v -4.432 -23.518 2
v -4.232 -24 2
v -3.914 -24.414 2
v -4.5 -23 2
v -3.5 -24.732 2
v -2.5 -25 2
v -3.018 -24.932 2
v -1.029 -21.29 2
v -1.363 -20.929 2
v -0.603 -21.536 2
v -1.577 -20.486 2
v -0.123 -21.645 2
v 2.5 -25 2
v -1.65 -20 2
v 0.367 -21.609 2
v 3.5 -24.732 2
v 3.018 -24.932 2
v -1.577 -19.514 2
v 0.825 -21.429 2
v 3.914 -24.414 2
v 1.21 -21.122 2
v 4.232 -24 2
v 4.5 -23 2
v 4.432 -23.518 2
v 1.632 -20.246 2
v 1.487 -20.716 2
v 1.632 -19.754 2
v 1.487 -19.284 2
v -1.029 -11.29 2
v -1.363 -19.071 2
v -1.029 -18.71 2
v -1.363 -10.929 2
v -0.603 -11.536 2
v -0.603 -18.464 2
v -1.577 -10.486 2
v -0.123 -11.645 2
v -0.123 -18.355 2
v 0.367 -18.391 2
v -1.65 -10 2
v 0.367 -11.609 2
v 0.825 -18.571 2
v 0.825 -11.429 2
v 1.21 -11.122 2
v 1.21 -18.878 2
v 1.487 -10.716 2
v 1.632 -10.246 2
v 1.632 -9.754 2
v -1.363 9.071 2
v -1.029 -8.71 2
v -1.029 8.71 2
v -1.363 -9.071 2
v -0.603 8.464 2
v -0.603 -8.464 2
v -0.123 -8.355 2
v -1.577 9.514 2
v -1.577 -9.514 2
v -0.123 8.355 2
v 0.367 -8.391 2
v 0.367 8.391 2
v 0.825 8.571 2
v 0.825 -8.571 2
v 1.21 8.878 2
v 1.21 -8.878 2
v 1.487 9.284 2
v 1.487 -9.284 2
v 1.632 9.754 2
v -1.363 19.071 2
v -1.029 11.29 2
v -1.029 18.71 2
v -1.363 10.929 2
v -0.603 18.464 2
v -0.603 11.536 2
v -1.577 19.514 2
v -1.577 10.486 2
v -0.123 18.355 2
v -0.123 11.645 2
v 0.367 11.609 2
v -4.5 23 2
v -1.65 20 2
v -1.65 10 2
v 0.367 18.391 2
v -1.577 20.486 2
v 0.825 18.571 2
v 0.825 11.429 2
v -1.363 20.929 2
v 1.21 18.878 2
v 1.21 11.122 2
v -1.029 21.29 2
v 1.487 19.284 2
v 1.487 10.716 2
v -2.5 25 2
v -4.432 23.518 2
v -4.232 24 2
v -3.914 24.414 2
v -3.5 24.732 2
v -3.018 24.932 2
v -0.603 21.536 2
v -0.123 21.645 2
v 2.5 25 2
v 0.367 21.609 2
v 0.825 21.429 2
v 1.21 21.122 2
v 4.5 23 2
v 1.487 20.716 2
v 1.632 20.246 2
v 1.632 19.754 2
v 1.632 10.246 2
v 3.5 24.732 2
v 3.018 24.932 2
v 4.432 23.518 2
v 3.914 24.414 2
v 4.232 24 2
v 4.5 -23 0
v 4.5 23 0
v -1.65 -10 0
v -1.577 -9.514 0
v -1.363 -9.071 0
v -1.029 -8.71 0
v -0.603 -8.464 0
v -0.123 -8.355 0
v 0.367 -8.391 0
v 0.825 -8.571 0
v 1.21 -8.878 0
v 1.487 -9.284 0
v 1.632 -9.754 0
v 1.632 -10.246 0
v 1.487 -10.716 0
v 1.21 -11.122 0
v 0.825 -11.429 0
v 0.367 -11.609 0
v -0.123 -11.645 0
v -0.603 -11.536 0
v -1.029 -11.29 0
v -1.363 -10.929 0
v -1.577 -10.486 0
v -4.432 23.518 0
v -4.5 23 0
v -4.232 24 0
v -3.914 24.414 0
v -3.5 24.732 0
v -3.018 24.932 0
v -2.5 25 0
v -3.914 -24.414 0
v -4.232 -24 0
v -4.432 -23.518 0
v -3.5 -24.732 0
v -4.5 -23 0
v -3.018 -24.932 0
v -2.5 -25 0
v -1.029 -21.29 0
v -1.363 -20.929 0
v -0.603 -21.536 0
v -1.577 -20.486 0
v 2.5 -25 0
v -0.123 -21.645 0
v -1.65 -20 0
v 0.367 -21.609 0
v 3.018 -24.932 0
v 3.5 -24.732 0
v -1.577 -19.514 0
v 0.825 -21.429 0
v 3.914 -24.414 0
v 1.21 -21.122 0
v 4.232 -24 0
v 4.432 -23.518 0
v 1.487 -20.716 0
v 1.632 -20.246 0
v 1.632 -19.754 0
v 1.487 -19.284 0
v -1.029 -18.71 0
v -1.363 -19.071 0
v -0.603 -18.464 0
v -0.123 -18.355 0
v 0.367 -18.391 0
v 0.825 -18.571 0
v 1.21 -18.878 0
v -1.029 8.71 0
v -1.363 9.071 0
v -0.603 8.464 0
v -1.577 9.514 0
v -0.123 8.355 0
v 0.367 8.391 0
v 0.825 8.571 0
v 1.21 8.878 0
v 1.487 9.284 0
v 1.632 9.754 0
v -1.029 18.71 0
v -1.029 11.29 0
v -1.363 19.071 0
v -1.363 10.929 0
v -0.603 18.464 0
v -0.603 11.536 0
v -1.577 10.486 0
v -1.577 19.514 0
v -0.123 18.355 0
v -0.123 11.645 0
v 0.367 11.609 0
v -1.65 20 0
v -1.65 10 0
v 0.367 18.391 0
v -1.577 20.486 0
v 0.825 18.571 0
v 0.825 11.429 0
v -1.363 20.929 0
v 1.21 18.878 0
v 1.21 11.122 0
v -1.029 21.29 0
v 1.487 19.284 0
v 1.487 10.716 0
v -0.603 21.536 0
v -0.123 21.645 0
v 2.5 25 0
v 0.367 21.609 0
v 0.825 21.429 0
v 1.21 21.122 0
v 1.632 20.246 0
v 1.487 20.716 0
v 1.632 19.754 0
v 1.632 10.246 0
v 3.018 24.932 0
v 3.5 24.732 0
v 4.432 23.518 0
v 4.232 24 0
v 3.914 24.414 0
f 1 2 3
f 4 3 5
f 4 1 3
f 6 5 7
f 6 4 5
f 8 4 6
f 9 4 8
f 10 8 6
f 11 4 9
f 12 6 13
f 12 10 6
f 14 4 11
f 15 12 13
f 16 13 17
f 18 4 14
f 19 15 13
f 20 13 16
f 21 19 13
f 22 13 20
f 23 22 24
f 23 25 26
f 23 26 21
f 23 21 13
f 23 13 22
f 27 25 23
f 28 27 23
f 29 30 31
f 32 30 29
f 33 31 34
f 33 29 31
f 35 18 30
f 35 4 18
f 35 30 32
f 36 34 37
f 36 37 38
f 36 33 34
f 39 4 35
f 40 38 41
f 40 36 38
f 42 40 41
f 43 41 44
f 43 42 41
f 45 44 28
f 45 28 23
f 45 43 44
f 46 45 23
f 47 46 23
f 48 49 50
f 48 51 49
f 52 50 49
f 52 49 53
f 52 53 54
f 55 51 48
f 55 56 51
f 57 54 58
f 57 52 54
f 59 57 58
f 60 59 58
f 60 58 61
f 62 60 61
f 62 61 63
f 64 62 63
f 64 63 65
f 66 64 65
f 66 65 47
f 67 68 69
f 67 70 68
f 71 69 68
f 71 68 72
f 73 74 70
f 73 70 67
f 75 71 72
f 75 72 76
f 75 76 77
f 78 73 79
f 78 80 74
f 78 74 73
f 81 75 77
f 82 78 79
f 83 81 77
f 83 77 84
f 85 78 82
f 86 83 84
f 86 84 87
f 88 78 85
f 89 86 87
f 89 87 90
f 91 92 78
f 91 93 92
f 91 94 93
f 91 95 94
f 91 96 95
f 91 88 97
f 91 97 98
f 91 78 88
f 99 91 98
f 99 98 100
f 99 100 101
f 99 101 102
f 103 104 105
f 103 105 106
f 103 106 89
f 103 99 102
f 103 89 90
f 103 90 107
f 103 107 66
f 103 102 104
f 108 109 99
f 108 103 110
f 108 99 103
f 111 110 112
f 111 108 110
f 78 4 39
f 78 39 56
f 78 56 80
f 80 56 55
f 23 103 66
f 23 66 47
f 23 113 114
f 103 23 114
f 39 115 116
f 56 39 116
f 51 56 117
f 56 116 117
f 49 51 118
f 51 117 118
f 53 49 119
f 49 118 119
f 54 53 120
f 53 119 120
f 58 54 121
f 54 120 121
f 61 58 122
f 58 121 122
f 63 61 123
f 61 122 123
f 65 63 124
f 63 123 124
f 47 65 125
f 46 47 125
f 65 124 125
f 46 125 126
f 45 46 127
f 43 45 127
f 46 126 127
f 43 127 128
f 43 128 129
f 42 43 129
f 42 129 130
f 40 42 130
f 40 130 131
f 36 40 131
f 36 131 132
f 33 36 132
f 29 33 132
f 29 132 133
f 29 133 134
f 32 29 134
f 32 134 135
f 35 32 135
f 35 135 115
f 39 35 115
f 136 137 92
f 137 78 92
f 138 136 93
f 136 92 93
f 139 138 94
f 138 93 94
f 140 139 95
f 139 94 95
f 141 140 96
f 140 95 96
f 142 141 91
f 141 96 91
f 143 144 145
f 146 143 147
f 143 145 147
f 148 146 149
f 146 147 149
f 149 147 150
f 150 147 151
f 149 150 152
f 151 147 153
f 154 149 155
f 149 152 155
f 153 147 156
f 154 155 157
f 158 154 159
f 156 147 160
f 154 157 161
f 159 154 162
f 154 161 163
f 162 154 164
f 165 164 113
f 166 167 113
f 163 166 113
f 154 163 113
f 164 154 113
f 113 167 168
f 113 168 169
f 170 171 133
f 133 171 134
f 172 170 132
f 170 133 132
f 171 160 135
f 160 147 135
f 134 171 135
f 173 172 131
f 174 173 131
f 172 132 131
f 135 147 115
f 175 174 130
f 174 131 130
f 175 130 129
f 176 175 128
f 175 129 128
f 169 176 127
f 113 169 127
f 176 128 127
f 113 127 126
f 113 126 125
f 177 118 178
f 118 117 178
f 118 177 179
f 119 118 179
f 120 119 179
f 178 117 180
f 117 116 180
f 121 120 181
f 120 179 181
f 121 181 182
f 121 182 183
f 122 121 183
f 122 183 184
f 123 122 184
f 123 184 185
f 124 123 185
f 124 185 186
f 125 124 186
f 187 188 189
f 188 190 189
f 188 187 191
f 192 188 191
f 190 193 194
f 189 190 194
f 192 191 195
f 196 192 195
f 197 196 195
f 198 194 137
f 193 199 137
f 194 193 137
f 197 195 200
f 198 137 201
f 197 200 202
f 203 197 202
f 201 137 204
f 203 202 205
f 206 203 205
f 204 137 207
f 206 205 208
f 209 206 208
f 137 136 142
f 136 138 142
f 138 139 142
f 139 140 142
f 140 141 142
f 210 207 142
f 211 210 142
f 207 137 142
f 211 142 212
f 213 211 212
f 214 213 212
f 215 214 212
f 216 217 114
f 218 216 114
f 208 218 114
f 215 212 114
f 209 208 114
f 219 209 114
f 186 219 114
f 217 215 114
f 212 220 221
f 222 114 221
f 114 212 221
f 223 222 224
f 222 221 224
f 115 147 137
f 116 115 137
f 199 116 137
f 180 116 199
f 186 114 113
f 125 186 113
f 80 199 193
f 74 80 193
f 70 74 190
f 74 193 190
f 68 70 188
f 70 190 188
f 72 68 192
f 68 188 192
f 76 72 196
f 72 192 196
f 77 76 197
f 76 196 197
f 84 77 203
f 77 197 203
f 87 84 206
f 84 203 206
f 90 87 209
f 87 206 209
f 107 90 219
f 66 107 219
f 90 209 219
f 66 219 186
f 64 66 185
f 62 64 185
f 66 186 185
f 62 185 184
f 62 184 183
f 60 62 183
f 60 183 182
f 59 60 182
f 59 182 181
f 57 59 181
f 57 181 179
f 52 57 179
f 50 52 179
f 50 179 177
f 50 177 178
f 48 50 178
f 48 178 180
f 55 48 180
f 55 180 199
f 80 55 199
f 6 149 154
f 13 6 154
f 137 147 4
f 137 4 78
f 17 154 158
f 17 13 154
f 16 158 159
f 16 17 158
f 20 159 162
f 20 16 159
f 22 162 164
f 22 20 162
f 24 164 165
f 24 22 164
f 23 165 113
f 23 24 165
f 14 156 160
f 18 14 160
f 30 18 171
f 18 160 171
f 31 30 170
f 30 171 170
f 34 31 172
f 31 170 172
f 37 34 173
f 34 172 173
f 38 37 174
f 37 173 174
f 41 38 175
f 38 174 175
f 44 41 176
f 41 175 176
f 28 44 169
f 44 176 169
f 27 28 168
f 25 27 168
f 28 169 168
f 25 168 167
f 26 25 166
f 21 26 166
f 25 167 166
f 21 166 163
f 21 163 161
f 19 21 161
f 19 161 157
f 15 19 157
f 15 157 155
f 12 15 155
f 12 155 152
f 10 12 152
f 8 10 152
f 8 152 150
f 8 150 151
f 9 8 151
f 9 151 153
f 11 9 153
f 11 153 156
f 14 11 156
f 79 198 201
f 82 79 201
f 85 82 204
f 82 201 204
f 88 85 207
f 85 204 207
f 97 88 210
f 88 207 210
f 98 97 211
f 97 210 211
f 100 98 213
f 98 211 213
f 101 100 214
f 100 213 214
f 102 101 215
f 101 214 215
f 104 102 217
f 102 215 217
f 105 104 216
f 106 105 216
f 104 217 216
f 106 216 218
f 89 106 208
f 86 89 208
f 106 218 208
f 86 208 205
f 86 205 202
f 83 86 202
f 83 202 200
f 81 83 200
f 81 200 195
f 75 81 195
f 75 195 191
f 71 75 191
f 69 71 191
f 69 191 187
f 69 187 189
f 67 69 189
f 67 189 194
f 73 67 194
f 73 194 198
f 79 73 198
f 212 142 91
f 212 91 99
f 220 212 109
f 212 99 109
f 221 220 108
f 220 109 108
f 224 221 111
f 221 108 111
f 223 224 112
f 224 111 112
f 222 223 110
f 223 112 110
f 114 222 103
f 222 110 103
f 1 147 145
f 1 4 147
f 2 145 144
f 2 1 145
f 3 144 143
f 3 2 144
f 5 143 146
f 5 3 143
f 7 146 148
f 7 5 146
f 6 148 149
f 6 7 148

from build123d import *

# Parameters (mm, degrees)
SKETCH_1_W            = 9
SKETCH_1_H            = 50
EXTRUDE_1_DEPTH       = 2
HOLE_WIZARD_M41_D     = 3.3
HOLE_WIZARD_M41_DEPTH = 11.5
HOLE_WIZARD_M41_TIP   = 0.991420021
FILLET_1_R            = 2


with BuildPart() as part:
    # Эскиз1 → Бобышка-Вытянуть1 (new body)
    with BuildSketch(Plane.XY):
        Rectangle(SKETCH_1_W, SKETCH_1_H)
    extrude(amount=EXTRUDE_1_DEPTH)

    # Отверстие обработанное метчиком M41
    with Locations(Plane.XY.offset(2)):
        with Locations((0, -10), (0, 20), (0, 10), (0, -20)):
            Hole(HOLE_WIZARD_M41_D / 2, depth=HOLE_WIZARD_M41_DEPTH)
            with Locations((0, 0, -(HOLE_WIZARD_M41_DEPTH + HOLE_WIZARD_M41_TIP / 2))):  # 118° drill point
                Cone(0, HOLE_WIZARD_M41_D / 2, HOLE_WIZARD_M41_TIP, mode=Mode.SUBTRACT)

    # Скругление1
    fillet_1_edges = [part.edges().sort_by_distance(p)[0] for p in [
        (4.5, -25, 1),
        (-4.5, -25, 1),
        (-4.5, 25, 1),
        (4.5, 25, 1),
    ]]
    fillet(fillet_1_edges, radius=FILLET_1_R)


solid = part.part
